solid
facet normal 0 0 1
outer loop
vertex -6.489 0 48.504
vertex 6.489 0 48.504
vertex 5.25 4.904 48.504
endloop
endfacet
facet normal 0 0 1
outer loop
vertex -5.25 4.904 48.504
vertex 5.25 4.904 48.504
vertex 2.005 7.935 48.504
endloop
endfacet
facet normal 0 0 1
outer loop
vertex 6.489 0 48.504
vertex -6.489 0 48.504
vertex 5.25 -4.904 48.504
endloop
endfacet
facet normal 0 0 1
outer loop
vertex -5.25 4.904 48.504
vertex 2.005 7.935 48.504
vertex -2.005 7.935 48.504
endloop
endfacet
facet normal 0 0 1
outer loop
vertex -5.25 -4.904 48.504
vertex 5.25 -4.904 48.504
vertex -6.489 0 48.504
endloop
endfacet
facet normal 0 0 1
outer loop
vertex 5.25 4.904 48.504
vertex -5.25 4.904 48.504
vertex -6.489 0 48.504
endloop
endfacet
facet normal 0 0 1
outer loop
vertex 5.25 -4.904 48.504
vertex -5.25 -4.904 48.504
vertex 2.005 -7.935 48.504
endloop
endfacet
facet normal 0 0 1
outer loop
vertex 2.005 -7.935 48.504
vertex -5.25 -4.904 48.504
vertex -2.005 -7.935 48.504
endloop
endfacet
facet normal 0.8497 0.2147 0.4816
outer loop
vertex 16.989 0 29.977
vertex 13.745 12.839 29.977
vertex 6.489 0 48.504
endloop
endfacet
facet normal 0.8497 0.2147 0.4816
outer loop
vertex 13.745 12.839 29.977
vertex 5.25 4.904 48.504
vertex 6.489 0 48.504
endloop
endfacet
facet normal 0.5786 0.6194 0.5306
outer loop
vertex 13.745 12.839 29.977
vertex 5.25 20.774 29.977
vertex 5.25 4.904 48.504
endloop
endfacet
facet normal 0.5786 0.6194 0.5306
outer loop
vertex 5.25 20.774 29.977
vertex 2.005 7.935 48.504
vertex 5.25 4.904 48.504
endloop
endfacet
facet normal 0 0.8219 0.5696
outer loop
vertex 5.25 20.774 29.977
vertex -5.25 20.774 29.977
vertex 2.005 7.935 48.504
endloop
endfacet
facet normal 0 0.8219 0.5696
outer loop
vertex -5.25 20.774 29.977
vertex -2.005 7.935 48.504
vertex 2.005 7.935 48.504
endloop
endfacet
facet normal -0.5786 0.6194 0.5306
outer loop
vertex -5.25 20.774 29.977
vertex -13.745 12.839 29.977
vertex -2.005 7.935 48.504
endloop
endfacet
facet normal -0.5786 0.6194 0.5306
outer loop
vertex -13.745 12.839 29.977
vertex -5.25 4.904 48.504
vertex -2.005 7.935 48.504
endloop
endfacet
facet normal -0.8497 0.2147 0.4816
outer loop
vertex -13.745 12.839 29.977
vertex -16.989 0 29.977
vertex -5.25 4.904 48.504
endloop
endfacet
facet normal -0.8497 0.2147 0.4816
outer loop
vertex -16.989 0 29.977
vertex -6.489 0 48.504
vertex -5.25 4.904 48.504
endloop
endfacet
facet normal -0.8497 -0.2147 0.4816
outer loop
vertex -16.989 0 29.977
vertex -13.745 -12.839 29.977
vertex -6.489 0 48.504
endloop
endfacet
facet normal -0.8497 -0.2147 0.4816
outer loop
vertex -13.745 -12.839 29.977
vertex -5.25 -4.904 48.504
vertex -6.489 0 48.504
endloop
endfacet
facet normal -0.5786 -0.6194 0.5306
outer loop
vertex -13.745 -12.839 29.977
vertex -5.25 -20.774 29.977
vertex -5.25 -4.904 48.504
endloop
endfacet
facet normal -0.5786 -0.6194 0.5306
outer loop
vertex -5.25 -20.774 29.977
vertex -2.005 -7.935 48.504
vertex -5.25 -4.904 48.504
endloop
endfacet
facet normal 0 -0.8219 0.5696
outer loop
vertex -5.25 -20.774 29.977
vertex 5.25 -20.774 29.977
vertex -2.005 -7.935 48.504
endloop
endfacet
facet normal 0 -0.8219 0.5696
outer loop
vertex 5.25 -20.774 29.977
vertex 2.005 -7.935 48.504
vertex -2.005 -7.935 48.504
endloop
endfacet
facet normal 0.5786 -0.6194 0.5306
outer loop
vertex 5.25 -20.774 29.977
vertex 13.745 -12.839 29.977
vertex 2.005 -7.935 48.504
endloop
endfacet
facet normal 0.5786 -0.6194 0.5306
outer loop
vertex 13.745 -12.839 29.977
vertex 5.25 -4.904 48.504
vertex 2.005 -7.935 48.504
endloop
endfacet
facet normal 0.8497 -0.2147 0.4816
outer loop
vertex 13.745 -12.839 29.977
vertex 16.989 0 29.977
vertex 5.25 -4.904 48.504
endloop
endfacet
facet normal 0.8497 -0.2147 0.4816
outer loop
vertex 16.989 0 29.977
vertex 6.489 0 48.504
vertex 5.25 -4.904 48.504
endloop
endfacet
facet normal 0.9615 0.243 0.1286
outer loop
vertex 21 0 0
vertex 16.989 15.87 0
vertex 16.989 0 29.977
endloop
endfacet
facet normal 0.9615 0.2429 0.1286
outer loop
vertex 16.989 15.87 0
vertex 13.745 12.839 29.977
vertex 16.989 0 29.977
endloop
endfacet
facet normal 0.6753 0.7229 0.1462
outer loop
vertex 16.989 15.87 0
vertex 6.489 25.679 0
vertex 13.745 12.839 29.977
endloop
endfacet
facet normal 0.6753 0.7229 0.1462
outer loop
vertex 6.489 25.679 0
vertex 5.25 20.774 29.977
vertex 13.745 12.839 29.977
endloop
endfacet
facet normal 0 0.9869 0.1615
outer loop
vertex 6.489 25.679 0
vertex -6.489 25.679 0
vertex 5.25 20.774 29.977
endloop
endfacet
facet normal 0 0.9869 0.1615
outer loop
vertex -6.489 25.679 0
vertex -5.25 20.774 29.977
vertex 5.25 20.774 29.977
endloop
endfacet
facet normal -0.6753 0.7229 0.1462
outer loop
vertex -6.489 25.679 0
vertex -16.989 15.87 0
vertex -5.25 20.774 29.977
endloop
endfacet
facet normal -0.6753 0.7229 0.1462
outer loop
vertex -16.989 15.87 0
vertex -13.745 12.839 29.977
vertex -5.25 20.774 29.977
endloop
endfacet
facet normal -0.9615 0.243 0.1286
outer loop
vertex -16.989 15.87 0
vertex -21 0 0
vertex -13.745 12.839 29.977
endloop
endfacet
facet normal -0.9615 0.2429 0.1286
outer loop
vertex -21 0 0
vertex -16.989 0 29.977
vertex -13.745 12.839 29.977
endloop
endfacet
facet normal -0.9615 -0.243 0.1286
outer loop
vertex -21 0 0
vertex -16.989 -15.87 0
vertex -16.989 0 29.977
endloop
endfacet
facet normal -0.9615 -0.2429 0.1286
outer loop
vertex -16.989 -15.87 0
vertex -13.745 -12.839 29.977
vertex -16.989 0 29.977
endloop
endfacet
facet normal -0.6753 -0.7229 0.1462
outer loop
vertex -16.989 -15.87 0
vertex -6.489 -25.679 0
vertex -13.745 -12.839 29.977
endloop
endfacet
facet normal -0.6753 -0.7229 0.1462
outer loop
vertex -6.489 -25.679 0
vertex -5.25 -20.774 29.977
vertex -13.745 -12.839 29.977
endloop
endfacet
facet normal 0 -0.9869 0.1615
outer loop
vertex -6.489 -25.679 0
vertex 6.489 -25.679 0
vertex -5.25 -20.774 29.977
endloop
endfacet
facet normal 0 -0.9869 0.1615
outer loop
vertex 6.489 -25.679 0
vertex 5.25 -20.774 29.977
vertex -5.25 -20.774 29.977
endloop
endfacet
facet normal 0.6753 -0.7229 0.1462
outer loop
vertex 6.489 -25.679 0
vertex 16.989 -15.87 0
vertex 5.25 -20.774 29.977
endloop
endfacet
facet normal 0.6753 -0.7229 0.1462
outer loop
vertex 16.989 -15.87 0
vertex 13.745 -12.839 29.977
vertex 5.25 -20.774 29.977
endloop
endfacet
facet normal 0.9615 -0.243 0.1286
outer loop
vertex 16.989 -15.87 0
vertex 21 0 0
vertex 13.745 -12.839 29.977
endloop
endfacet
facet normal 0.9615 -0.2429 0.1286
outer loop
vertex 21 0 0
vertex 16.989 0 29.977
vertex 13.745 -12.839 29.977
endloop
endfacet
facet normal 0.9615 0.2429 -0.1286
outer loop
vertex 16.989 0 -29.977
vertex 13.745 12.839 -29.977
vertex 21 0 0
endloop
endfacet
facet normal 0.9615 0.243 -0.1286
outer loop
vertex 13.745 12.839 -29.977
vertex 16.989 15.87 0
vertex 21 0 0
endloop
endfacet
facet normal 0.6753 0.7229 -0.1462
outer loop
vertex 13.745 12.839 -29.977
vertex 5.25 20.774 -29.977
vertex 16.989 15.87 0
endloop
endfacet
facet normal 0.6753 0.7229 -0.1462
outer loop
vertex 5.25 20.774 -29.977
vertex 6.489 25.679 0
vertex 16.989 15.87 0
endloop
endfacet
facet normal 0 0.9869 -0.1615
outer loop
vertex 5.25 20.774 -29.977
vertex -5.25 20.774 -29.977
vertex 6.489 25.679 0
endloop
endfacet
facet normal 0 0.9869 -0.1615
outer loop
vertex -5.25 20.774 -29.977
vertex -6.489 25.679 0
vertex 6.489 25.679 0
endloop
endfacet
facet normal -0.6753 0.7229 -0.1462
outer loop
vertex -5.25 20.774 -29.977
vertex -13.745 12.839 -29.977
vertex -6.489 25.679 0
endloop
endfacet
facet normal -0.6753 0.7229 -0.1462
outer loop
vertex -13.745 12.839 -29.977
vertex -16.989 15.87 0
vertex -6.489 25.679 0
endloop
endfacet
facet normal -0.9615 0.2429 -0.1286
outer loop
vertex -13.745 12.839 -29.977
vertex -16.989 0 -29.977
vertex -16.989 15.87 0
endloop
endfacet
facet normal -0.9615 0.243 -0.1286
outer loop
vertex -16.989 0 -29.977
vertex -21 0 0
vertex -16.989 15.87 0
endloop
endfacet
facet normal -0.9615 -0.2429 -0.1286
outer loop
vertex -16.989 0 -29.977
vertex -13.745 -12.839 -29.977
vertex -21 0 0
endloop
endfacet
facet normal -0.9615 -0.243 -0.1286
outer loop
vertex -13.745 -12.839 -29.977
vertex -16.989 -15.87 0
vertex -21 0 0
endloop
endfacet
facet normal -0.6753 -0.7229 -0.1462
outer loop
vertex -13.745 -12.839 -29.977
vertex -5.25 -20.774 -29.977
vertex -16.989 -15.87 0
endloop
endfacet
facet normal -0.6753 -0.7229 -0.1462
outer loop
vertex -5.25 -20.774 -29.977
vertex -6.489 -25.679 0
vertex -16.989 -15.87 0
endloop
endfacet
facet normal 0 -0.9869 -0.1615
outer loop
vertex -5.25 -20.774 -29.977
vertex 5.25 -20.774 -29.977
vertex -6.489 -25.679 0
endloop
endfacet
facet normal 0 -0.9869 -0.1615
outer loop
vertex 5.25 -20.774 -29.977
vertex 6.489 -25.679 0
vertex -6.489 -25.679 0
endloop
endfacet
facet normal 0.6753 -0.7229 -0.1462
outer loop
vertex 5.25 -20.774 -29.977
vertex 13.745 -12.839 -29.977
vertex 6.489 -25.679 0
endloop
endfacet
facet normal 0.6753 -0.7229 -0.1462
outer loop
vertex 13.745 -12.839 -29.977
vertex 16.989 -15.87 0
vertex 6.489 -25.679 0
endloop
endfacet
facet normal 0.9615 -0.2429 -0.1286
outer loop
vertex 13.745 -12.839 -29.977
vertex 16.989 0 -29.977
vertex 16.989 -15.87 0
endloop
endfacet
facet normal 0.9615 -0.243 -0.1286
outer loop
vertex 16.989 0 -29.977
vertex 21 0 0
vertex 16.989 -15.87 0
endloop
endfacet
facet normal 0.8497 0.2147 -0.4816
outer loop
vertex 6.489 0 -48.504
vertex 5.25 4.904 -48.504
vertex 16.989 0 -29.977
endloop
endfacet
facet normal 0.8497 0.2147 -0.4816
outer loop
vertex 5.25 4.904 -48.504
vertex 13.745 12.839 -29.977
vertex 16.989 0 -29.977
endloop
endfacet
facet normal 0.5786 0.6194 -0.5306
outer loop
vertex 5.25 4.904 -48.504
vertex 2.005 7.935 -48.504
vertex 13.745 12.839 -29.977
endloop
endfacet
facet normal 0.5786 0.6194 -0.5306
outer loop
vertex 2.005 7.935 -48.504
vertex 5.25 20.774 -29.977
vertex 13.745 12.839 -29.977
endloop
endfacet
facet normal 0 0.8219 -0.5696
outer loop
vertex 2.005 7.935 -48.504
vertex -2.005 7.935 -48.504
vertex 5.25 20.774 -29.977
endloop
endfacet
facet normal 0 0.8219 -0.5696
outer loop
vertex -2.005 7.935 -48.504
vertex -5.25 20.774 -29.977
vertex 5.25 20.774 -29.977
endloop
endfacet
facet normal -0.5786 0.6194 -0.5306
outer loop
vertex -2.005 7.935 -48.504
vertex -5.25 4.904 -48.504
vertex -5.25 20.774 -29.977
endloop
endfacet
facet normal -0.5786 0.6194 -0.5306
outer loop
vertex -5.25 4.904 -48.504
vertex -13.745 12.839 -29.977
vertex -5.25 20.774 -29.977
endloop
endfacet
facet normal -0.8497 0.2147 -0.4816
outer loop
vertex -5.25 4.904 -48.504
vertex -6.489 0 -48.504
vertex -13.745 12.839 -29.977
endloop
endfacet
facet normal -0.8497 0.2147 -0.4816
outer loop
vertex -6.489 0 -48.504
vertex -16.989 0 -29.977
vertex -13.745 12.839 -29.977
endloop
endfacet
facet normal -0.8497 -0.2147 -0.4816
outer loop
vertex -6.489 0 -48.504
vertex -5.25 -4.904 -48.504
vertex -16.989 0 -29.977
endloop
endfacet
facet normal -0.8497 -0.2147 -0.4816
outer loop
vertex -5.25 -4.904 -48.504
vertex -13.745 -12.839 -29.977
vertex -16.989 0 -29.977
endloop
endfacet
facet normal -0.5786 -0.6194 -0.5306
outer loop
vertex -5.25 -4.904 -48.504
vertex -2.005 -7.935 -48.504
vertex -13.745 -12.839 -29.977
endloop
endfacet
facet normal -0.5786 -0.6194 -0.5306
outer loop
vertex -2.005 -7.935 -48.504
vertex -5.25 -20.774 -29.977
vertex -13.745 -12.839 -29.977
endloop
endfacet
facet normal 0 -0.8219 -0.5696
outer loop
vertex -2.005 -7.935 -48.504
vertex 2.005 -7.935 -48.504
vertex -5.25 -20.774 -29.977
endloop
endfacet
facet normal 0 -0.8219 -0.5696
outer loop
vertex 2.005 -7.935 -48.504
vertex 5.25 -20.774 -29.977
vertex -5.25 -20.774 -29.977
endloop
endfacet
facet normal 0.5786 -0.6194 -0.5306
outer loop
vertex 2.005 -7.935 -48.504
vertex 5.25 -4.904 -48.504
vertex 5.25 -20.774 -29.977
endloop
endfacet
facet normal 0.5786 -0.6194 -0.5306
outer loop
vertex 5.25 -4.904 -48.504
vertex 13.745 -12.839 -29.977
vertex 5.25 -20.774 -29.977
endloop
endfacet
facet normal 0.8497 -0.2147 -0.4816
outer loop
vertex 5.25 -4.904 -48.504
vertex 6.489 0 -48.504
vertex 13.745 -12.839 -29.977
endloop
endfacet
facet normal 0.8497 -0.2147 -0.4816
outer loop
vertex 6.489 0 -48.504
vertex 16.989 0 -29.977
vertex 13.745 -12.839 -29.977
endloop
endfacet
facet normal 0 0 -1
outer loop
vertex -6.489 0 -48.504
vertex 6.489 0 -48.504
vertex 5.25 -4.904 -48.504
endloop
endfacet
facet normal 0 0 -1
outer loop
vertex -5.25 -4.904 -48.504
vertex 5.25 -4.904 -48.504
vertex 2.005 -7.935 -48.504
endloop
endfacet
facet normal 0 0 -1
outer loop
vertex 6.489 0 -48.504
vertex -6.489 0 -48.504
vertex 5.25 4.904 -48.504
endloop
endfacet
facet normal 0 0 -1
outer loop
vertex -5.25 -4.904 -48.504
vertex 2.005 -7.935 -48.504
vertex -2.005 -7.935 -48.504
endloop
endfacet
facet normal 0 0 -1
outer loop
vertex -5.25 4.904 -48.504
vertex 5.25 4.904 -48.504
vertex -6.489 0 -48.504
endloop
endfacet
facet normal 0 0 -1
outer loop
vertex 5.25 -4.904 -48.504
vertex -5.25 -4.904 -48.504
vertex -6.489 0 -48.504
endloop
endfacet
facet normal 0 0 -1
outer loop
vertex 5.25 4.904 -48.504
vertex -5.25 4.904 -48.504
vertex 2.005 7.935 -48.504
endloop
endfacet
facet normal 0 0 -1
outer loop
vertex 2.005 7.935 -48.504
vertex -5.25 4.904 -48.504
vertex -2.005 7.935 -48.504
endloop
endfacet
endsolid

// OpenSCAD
// Generated by SolidPython 1.0.1 on 2020-07-29 00:46:47


scale(v = [7, 9, 17]) {
	sphere(r = 3);
}
/***********************************************
*********      SolidPython code:      **********
************************************************
 
# import packages: SolidPython
from solid import *
from solid.utils import *
from itertools import chain, combinations, permutations


class Resize:

    def __init__(self, scad_file):
        self.scad_file = scad_file
        #self.scad_file = import_scad(scad_file)
        # cone/cylinder param:
        self.r1 = 0
        self.r2 = 0
        self.h = 0
        # rectangular prism param:
        self.w = 0
        self.l = 0
        # ellipse param:
        self.r = 0

    # import OpenScad code (file name corresponds to shape)


    # classify shape + parameters
    def assign(self, param1, param2, param3):
        if self.scad_file == 'cone.scad':
            self.r1 = param1
            self.r2 = param2
            self.h = param3
        elif self.scad_file == 'cylinder.scad':
            self.r1 = param1
            self.r2 = param2
            self.h = param3
        elif self.scad_file == 'rectangularPrism.scad':
            self.h = param1
            self.l = param2
            self.w = param3
        else:
            self.r = param1
            self.h = param2

    # resize parameters
    def iterate(self):
        x = range(3, 20, 2)
        i = 1
        if self.scad_file == 'cone.scad':
            tempList = list(permutations(x, 2))
            for temp in tempList:
                param1 = temp[0]
                param2 = temp[1]
                filepath = 'produced_scad_files/' + 'cone' + str(param1) + '_' + str(param2) + '_' + '.scad'
                scad_render_to_file(cylinder(h=param1, r1=param2, r2=0), filepath)

        elif self.scad_file == 'cylinder.scad':
            tempList = list(permutations(x, 3))
            for temp in tempList:
                param1 = temp[0]
                param2 = temp[1]
                filepath = 'produced_scad_files/' + 'cylinder' + str(param1) + '_' + str(param2) + '_' + '.scad'
                scad_render_to_file(cylinder(h=param1, r1=param2, r2=param2), filepath)

        elif self.scad_file == 'rectangularPrism.scad':
            tempList = list(permutations(x, 3))
            for temp in tempList:
                param1 = temp[0]
                param2 = temp[1]
                param3 = temp[2]
                filepath = 'produced_scad_files/' + 'rectangularPrism' + str(param1) + '_' + str(param2) + '_' + str(
                    param3) + '.scad'
                scad_render_to_file(cube(size=(param1, param2, param3)), filepath)

        elif self.scad_file == 'ellipse.scad':
            tempList = list(permutations(x, 4))
            for temp in tempList:
                param1 = temp[0]
                param2 = temp[1]
                param3 = temp[2]
                param4 = temp[3]
                filepath = 'produced_scad_files/' + 'ellipse' + str(param1) + '_' + str(param2) + '_' + str(param3) + '_' + str(param4) + '.scad'
                scad_render_to_file(scale([param1, param2, param3])(sphere(r=param4)), filepath)

    def render_to_scadfile(self):
        scad_render_to_file(scad, 'example.scad') 
 
************************************************/
